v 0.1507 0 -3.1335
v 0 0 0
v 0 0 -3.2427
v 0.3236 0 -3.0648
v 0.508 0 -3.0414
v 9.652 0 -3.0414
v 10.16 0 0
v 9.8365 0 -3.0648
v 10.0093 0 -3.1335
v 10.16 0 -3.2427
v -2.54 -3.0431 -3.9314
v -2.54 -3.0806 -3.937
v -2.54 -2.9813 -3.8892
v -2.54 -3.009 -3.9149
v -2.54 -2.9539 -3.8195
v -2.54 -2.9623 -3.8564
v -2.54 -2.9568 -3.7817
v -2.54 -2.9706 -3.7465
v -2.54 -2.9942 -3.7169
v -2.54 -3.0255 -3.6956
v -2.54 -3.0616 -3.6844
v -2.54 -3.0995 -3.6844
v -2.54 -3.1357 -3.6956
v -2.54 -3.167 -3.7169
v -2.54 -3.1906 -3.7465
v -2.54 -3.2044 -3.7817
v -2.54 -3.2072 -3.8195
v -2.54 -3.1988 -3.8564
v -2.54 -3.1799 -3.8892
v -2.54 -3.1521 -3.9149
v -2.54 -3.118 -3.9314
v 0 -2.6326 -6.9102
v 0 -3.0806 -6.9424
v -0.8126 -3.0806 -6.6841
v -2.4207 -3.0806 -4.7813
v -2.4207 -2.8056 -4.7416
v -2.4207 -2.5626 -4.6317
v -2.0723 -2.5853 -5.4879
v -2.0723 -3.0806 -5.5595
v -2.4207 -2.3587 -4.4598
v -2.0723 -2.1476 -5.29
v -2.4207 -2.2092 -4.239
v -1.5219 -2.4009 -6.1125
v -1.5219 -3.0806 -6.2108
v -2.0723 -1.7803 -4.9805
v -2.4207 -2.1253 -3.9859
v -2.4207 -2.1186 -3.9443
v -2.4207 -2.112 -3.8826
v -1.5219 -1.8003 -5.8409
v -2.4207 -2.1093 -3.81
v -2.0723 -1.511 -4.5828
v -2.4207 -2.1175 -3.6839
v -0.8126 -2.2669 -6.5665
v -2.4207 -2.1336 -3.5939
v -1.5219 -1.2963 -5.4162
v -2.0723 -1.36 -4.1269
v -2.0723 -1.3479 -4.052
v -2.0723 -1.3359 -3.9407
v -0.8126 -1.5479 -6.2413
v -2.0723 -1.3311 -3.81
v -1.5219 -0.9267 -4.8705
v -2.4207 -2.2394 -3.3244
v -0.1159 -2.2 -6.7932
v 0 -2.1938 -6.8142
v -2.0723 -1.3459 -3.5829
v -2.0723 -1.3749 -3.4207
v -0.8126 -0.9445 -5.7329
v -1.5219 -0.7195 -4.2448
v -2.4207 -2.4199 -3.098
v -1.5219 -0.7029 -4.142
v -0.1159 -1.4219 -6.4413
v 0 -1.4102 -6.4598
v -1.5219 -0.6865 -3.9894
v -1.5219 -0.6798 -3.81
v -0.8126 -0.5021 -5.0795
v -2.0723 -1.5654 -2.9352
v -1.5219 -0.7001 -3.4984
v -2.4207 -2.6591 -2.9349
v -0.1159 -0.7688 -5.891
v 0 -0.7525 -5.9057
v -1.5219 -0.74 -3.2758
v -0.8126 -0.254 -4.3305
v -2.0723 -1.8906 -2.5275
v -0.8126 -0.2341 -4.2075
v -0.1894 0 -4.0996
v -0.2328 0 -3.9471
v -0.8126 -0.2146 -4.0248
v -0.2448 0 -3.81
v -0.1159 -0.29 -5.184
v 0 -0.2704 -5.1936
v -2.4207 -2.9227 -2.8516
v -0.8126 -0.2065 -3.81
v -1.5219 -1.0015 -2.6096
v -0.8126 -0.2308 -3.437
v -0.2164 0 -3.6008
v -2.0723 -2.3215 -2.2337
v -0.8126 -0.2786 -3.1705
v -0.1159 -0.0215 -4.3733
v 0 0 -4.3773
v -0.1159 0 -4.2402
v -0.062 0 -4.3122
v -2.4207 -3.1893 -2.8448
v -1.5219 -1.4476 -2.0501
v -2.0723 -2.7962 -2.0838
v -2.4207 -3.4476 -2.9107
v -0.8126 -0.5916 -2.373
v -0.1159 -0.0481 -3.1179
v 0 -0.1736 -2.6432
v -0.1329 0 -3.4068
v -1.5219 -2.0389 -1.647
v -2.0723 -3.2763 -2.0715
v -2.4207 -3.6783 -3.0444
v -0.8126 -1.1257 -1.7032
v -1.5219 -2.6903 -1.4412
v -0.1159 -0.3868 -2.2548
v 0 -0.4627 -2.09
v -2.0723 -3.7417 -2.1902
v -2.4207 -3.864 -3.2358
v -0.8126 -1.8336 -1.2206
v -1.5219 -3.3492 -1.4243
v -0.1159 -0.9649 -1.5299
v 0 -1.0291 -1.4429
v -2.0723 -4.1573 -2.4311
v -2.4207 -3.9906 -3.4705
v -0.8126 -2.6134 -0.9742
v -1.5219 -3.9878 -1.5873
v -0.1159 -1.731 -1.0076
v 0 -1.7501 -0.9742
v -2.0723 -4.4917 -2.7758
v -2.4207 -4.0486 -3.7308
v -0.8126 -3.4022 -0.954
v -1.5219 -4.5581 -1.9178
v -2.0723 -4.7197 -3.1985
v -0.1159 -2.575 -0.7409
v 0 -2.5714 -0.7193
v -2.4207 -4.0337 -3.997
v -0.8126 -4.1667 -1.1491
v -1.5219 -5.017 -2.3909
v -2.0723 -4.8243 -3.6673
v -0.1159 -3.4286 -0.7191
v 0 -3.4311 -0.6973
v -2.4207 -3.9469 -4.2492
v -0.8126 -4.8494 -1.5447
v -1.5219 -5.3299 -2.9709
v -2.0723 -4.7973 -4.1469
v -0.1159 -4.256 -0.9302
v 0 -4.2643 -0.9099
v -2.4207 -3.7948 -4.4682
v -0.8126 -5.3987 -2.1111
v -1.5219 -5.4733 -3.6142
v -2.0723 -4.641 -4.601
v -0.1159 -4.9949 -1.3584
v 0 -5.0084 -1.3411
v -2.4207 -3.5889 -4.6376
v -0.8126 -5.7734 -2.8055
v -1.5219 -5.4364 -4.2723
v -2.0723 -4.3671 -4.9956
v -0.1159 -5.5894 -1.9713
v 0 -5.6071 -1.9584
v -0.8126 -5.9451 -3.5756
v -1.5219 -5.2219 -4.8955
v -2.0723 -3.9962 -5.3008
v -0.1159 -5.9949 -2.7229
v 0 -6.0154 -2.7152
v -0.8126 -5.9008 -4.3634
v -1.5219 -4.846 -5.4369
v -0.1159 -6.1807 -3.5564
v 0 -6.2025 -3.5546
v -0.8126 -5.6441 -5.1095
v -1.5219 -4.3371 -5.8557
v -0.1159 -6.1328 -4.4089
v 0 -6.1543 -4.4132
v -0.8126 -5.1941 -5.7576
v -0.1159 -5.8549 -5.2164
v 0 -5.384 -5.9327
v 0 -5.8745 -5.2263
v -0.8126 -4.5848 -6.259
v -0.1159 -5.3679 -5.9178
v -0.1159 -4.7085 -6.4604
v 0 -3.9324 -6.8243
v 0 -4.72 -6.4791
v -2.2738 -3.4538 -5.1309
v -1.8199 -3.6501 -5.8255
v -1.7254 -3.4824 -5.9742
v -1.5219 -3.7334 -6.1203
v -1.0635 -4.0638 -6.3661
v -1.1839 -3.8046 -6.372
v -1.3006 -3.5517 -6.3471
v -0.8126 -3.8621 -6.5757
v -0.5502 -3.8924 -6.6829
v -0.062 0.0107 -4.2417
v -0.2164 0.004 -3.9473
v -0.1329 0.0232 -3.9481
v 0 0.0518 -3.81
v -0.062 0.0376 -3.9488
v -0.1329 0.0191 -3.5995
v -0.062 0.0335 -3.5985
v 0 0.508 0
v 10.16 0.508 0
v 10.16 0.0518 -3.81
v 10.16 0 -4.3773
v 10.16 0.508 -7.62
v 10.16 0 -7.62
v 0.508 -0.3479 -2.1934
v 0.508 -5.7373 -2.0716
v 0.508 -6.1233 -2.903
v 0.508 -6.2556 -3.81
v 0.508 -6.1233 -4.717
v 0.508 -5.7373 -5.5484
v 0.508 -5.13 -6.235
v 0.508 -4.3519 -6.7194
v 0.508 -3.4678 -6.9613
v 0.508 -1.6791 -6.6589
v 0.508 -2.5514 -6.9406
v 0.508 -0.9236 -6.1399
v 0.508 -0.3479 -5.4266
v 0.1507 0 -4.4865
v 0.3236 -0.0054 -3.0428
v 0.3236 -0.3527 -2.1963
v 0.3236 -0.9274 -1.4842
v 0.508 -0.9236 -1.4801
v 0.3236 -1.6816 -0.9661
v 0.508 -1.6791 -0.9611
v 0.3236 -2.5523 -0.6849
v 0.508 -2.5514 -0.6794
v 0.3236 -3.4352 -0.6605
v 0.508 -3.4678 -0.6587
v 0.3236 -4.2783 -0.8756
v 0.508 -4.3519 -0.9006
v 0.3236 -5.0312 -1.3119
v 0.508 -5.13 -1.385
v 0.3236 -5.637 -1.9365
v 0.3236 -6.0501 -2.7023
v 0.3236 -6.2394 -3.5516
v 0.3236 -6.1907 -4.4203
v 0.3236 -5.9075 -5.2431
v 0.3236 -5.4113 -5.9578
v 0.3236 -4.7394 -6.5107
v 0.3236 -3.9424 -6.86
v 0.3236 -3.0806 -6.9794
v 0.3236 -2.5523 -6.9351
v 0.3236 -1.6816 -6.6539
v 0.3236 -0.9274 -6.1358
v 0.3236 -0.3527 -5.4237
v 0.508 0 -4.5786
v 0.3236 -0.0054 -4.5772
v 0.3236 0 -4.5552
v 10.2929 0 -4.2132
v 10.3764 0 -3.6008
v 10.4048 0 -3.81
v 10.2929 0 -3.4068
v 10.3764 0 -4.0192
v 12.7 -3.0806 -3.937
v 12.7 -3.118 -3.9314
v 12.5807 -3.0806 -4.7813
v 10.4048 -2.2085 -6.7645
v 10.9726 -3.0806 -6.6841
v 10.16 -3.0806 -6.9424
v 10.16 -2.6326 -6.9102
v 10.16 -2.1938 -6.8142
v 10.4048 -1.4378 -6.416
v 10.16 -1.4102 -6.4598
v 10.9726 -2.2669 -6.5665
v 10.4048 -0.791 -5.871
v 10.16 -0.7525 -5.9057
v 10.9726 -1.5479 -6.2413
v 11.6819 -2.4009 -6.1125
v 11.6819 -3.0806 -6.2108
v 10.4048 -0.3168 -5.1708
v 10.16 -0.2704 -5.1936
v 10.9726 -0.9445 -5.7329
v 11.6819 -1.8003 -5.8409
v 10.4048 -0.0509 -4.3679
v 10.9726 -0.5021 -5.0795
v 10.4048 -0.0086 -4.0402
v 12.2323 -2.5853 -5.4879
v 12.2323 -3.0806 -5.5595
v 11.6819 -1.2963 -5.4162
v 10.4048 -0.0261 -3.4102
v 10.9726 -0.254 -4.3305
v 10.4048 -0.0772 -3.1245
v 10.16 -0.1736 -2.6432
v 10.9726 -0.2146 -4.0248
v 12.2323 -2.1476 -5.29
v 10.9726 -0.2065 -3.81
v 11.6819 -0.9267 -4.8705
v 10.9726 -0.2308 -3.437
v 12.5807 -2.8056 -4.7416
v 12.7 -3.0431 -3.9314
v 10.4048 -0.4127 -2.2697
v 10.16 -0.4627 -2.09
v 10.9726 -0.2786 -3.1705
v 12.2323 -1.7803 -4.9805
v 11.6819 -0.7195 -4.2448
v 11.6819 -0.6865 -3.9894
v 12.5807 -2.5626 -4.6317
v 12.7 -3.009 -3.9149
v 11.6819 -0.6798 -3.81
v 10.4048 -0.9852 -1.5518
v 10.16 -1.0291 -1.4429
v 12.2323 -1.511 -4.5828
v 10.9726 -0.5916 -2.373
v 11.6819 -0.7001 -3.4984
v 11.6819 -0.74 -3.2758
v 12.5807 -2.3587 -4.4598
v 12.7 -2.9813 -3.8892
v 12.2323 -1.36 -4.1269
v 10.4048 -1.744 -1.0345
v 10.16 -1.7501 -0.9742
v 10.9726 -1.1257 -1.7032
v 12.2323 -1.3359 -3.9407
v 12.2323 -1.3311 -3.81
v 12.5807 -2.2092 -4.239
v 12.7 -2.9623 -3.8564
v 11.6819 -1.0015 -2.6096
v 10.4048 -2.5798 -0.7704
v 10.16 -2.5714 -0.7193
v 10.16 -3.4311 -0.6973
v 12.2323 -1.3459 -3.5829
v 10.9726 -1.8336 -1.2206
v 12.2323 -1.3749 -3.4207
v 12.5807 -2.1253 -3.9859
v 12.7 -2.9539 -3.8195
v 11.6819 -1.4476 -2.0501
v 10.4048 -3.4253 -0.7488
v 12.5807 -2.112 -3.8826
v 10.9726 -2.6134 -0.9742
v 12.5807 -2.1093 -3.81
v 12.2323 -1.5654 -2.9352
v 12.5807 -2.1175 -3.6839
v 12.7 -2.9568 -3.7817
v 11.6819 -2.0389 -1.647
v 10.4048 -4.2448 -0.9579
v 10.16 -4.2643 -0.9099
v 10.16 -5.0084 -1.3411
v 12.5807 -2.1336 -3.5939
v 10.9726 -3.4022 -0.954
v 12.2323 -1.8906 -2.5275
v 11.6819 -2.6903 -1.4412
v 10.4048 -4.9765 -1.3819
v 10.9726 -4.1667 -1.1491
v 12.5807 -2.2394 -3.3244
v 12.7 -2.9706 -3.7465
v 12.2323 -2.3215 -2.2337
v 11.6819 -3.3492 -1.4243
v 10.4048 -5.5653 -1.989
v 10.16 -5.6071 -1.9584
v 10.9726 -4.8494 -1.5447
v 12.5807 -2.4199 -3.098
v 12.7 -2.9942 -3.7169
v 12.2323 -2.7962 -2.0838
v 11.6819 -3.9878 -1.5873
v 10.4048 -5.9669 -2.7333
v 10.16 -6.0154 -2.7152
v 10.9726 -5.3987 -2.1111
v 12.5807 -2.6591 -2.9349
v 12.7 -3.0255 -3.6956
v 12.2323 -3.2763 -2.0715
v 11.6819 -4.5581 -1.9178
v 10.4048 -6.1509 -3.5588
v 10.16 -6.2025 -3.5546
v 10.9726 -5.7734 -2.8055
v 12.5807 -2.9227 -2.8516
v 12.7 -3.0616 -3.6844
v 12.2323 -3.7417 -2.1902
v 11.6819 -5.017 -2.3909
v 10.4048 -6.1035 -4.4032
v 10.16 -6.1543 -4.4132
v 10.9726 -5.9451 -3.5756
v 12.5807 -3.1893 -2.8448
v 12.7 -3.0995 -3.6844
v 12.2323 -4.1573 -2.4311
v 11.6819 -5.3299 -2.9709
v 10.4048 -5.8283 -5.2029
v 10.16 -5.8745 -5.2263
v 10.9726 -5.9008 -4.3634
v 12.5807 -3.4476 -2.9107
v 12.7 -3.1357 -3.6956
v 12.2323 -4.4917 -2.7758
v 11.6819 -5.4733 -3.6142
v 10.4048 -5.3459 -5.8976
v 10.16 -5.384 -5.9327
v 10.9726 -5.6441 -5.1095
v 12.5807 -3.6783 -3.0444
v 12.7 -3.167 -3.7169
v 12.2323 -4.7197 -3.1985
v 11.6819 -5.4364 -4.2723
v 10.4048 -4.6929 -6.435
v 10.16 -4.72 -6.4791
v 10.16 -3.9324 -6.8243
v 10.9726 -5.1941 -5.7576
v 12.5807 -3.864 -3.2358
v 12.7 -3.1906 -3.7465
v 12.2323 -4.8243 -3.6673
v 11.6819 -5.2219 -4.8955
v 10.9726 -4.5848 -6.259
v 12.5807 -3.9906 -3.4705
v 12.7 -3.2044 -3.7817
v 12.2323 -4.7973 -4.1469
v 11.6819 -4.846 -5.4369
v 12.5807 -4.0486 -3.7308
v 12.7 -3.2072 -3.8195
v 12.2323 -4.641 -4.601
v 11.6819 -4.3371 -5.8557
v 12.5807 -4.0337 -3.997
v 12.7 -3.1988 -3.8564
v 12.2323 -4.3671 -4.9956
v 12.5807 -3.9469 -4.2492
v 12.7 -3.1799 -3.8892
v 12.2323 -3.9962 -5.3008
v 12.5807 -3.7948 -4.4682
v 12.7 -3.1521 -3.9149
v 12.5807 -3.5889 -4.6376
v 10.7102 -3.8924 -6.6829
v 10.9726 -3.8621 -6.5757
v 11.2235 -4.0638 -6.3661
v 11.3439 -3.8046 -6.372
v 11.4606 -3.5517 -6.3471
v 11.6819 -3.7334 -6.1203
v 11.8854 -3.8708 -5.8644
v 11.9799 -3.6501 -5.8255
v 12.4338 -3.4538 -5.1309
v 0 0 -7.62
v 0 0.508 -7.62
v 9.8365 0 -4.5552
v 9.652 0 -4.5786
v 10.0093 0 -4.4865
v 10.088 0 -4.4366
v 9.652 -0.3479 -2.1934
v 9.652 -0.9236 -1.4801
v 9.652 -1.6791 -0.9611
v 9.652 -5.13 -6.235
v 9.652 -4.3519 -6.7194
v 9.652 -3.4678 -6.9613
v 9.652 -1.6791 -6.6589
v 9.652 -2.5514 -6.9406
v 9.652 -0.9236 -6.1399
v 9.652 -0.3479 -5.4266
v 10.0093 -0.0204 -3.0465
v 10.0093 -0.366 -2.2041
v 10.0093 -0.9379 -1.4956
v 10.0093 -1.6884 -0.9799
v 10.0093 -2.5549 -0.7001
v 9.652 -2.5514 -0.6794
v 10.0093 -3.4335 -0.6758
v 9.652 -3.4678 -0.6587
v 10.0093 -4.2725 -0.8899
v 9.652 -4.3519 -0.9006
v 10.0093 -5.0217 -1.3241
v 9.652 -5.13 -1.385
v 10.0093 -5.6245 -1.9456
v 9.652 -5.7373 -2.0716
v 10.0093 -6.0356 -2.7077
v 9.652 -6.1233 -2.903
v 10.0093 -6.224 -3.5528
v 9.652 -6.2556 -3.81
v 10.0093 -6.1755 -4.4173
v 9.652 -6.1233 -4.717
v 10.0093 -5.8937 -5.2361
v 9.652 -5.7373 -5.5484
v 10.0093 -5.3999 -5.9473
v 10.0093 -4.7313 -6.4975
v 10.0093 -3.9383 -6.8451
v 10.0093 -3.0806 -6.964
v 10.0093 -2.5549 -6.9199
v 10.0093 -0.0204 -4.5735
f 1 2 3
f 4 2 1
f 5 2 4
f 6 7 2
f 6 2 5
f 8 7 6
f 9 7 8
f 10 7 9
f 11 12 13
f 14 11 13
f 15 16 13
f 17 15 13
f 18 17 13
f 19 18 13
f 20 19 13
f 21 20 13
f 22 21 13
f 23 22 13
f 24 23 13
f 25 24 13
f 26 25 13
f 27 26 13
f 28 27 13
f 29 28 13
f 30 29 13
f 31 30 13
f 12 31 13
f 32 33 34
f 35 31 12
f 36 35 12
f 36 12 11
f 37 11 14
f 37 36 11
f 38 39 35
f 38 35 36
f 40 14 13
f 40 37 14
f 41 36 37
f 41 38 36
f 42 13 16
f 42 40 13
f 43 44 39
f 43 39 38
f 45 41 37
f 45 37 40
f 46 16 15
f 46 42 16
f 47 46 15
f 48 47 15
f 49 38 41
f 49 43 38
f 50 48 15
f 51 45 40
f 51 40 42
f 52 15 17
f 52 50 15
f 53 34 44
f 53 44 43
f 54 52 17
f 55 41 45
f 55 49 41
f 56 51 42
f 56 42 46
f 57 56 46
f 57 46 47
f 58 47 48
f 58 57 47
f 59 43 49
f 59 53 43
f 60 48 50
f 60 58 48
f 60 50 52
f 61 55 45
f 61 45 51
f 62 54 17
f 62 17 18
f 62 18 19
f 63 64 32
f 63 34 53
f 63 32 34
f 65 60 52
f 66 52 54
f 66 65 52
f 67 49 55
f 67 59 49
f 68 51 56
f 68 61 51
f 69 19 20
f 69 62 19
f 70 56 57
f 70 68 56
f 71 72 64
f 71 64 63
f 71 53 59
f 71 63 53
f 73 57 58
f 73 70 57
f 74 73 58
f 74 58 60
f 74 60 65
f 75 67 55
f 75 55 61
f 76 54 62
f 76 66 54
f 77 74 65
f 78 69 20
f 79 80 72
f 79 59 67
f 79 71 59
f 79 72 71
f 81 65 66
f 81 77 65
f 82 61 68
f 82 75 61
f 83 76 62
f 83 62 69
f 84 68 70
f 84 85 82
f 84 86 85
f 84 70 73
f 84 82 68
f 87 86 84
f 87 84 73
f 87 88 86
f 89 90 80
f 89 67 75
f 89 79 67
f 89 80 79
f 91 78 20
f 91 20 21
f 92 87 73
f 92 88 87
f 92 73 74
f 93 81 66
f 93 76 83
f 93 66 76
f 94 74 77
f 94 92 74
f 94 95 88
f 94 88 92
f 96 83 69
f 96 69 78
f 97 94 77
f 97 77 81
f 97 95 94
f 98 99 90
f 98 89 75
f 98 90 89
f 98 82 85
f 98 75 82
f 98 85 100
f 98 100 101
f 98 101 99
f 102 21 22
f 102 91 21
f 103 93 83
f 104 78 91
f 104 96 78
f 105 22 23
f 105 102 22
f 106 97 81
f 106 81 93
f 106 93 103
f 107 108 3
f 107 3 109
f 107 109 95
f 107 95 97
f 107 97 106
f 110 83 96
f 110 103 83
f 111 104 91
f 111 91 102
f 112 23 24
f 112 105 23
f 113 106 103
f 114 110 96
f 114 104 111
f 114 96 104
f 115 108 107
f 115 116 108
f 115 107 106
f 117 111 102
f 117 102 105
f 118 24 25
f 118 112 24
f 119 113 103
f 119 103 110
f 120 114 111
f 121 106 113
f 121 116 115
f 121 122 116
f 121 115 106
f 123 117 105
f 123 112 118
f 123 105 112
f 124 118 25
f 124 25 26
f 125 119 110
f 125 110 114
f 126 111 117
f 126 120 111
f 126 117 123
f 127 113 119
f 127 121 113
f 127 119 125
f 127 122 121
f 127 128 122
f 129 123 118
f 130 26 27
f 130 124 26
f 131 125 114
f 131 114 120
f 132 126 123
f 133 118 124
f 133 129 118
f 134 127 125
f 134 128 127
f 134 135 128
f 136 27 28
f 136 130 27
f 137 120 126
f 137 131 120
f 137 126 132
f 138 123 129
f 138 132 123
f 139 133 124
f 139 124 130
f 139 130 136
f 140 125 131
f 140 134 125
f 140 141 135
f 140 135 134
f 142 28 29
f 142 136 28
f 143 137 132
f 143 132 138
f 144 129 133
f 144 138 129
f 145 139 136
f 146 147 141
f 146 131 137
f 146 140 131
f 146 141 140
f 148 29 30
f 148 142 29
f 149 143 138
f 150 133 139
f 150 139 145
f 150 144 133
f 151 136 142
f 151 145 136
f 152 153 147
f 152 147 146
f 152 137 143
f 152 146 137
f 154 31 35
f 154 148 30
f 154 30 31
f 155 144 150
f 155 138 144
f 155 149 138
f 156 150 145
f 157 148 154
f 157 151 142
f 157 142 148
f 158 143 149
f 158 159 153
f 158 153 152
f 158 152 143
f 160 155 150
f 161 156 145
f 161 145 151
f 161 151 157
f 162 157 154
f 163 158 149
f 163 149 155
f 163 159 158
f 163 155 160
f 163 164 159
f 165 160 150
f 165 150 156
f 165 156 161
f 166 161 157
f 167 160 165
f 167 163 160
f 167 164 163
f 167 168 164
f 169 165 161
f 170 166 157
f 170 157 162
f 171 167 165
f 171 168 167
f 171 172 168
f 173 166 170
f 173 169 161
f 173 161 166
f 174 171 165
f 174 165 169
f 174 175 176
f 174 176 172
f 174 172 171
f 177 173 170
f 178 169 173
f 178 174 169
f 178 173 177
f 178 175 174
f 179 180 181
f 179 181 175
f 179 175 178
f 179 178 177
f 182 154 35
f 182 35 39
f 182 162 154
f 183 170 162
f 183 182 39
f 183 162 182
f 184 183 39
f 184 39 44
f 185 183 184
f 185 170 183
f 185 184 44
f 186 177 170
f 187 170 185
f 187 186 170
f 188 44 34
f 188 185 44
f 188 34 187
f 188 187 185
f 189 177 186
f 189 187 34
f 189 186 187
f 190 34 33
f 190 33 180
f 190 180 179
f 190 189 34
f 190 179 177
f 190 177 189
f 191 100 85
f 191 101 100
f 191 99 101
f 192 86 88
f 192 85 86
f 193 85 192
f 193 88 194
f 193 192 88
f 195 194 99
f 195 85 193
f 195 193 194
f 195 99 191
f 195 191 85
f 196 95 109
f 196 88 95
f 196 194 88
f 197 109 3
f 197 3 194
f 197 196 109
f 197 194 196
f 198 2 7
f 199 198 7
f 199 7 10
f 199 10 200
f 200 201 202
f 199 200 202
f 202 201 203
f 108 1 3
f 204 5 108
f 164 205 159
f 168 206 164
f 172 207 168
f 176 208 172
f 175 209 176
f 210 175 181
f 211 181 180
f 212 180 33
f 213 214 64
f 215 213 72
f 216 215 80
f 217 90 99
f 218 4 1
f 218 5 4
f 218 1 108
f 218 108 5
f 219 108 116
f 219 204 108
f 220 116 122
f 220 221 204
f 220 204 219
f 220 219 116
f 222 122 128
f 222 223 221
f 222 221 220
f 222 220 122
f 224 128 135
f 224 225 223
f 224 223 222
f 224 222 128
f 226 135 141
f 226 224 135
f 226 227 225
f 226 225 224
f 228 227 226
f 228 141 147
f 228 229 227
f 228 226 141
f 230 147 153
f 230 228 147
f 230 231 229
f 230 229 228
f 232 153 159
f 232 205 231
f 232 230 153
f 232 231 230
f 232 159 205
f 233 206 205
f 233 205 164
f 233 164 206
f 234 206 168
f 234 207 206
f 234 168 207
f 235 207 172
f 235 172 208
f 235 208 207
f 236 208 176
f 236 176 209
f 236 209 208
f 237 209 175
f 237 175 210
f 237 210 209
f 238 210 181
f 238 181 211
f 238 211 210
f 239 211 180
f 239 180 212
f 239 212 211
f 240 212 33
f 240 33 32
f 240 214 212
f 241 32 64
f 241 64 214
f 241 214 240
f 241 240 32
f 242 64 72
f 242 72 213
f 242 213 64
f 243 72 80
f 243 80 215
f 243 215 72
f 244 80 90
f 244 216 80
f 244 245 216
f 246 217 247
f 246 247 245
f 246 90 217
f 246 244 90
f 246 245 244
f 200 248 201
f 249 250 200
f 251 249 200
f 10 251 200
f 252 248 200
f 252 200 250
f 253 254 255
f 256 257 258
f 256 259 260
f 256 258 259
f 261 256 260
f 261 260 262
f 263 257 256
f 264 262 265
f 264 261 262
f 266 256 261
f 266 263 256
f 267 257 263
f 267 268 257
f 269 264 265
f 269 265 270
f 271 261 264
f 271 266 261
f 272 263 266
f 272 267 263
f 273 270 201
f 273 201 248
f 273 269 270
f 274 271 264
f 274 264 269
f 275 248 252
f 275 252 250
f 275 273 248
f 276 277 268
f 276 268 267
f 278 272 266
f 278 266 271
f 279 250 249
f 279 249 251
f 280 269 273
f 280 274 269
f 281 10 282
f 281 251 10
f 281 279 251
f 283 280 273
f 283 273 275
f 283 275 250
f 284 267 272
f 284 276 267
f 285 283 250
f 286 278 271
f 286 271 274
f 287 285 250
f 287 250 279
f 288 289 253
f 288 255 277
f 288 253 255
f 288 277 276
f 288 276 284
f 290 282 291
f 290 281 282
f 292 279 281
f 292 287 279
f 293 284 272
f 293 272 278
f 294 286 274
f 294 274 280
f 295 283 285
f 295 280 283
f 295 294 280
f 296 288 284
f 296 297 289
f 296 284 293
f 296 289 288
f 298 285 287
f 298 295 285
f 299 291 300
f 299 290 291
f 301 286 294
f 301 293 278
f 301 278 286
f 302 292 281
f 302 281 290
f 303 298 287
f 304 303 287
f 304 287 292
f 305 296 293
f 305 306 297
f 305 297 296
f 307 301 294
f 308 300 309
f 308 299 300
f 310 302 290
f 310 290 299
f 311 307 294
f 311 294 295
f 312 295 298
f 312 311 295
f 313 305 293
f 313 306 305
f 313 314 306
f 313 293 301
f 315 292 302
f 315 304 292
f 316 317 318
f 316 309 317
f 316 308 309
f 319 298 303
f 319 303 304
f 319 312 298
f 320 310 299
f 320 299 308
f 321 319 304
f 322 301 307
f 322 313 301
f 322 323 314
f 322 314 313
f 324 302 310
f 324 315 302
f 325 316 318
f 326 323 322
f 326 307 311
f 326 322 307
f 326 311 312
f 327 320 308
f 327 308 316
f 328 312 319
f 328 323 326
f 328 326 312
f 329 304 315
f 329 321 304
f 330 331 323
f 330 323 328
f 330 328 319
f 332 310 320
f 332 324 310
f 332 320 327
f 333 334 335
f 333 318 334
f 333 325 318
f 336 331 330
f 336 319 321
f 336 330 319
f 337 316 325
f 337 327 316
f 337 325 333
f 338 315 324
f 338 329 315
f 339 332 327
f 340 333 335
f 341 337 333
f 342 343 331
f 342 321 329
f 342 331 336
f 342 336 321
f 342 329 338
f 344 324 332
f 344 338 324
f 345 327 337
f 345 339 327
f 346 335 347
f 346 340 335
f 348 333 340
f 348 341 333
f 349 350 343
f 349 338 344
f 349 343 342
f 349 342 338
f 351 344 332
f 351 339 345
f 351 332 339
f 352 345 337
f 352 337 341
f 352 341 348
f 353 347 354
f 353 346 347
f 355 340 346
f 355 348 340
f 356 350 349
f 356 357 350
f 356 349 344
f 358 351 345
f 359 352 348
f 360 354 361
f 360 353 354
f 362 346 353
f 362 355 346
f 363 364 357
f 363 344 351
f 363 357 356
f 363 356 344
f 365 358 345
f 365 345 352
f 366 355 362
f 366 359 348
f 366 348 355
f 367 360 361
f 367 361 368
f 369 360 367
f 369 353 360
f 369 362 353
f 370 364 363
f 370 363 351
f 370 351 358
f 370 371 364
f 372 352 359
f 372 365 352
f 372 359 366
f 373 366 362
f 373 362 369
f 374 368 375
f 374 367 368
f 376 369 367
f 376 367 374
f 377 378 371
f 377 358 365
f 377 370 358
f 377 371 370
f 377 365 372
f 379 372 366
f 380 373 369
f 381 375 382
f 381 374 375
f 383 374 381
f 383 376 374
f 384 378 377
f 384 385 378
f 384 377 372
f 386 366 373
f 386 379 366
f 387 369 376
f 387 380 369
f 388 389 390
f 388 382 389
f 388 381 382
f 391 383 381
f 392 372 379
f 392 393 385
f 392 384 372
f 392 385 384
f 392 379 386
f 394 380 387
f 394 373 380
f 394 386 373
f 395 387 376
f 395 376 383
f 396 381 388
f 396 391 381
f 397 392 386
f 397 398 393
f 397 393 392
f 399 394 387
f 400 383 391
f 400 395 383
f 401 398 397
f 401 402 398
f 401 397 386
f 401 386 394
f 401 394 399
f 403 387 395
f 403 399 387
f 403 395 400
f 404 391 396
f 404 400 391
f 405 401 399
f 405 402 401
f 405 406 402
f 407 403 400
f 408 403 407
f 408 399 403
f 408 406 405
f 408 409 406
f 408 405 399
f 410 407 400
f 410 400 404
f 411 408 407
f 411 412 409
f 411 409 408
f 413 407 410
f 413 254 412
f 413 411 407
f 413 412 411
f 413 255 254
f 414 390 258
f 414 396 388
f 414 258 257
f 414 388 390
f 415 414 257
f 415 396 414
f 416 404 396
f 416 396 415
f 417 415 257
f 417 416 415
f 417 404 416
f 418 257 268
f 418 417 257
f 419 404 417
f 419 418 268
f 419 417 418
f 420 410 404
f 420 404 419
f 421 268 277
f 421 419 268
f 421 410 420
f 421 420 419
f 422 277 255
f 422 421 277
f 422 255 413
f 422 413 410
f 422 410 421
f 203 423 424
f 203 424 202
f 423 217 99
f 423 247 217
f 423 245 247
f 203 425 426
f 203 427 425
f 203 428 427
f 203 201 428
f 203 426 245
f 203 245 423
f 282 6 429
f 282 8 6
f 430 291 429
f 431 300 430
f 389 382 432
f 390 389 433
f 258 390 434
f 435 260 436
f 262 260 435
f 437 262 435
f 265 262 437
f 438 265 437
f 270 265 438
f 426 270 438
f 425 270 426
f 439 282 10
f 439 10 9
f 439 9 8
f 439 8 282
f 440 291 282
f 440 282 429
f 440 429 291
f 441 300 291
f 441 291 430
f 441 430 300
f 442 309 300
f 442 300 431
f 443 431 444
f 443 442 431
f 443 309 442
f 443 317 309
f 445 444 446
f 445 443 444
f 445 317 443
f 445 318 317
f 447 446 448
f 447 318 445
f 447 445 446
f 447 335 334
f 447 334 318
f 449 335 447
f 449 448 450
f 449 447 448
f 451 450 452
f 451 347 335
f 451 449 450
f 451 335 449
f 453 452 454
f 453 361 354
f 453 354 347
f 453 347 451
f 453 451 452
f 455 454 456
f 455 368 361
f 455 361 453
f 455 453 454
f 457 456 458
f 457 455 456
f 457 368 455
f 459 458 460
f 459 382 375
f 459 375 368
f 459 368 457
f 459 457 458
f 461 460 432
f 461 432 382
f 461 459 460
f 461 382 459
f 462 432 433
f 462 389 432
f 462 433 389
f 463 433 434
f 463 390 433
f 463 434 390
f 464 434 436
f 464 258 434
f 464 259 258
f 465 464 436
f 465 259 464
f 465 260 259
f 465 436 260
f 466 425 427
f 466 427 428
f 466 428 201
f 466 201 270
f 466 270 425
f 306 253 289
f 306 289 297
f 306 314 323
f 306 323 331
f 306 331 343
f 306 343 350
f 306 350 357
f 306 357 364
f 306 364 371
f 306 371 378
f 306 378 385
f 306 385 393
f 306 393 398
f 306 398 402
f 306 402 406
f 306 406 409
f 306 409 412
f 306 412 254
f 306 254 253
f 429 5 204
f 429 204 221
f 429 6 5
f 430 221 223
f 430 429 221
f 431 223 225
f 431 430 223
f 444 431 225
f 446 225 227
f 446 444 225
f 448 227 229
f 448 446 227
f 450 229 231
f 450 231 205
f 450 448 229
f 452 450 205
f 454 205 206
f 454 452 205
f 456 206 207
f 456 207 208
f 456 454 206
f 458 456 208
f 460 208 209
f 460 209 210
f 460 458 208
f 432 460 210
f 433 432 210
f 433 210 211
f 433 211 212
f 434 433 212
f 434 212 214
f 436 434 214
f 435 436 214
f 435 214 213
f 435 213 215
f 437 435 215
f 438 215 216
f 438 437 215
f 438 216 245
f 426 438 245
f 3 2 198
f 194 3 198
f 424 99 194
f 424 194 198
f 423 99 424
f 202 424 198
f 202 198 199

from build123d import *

# Parameters (mm, degrees)
SKETCH1_W           = 10.16
SKETCH1_H           = 7.62
BOSS_EXTRUDE1_DEPTH = 0.508
SKETCH2_R           = 3.175
BOSS_EXTRUDE2_DEPTH = 15.24
FILLET1_R           = 3.048
FILLET2_R           = 3.048


with BuildPart() as part:
    # Sketch1 → Boss-Extrude1 (new body)
    with BuildSketch(Plane(origin=(0, 0, 0), x_dir=(1, 0, 0), z_dir=(0, 1, 0))):
        with Locations((5.08, 3.81)):
            Rectangle(SKETCH1_W, SKETCH1_H)
    extrude(amount=BOSS_EXTRUDE1_DEPTH)

    # Sketch2 → Boss-Extrude2 (add)
    with BuildSketch(Plane(origin=(12.7, 0, 0), x_dir=(0, 0, -1), z_dir=(1, 0, 0))):
        with Locations((3.81, -3.080568226)):
            Circle(SKETCH2_R)
    extrude(amount=-BOSS_EXTRUDE2_DEPTH)

    # Fillet1
    # the kernel refuses this fillet: 3.048 mm, written as the material it takes off along each edge
    with BuildSketch(Plane(origin=(-2.54, -3.080568226, -3.81), x_dir=(0, 0, -1), z_dir=(0, -1, 0))) as fillet1_piece_1_section:
        with BuildLine():
            CenterArc((3.175 - FILLET1_R, FILLET1_R), FILLET1_R, 270, 90)
            Line((3.175 - FILLET1_R, 0), (3.175, 0))
            Line((3.175, 0), (3.175, FILLET1_R))
        make_face()
    fillet1_piece_1 = revolve(axis=Axis((-2.54, -3.080568226, -3.81), (1, 0, 0)), mode=Mode.PRIVATE)
    fillet1_piece_1 = split(fillet1_piece_1, bisect_by=Plane(origin=(0, -1.050120042, -6.248507941), z_dir=(1, 0, 0)), keep=Keep.TOP, mode=Mode.PRIVATE)
    fillet1_piece_1 = split(fillet1_piece_1, bisect_by=Plane(origin=(0.252364317, 0, -6.248507941), z_dir=(0, -1, 0)), keep=Keep.TOP, mode=Mode.PRIVATE)
    add(fillet1_piece_1, mode=Mode.SUBTRACT)
    with BuildSketch(Plane(origin=(-2.54, -3.080568226, -3.81), x_dir=(0, 0, -1), z_dir=(0, -1, 0))) as fillet1_piece_2_section:
        with BuildLine():
            CenterArc((3.175 - FILLET1_R, FILLET1_R), FILLET1_R, 270, 90)
            Line((3.175 - FILLET1_R, 0), (3.175, 0))
            Line((3.175, 0), (3.175, FILLET1_R))
        make_face()
    fillet1_piece_2 = revolve(axis=Axis((-2.54, -3.080568226, -3.81), (1, 0, 0)), mode=Mode.PRIVATE)
    fillet1_piece_2 = split(fillet1_piece_2, bisect_by=Plane(origin=(0, -3.080568226, -1.694272015), z_dir=(-1, 0, 0)), keep=Keep.TOP, mode=Mode.PRIVATE)
    fillet1_piece_2 = split(fillet1_piece_2, bisect_by=Plane(origin=(-1.845094679, 0, -1.694272015), z_dir=(0, -1, 0)), keep=Keep.TOP, mode=Mode.PRIVATE)
    add(fillet1_piece_2, mode=Mode.SUBTRACT)
    with BuildSketch(Plane(origin=(-2.54, -3.080568226, -3.81), x_dir=(0, 0, -1), z_dir=(0, -1, 0))) as fillet1_piece_3_section:
        with BuildLine():
            CenterArc((3.175 - FILLET1_R, FILLET1_R), FILLET1_R, 270, 90)
            Line((3.175 - FILLET1_R, 0), (3.175, 0))
            Line((3.175, 0), (3.175, FILLET1_R))
        make_face()
    fillet1_piece_3 = revolve(axis=Axis((-2.54, -3.080568226, -3.81), (1, 0, 0)), mode=Mode.PRIVATE)
    fillet1_piece_3 = split(fillet1_piece_3, bisect_by=Plane(origin=(0, 0.062655826, -3.81), z_dir=(-1, 0, 0)), keep=Keep.TOP, mode=Mode.PRIVATE)
    fillet1_piece_3 = split(fillet1_piece_3, bisect_by=Plane(origin=(-1.310113103, 0, -3.81), z_dir=(0, 1, 0)), keep=Keep.TOP, mode=Mode.PRIVATE)
    add(fillet1_piece_3, mode=Mode.SUBTRACT)

    # Fillet2
    # the kernel refuses this fillet: 3.048 mm, written as the material it takes off along each edge
    with BuildSketch(Plane(origin=(12.7, -3.080568226, -3.81), x_dir=(0, 0, -1), z_dir=(0, -1, 0))) as fillet2_piece_1_section:
        with BuildLine():
            CenterArc((3.175 - FILLET2_R, -FILLET2_R), FILLET2_R, 0, 90)
            Line((3.175 - FILLET2_R, 0), (3.175, 0))
            Line((3.175, 0), (3.175, -FILLET2_R))
        make_face()
    fillet2_piece_1 = revolve(axis=Axis((12.7, -3.080568226, -3.81), (1, 0, 0)), mode=Mode.PRIVATE)
    fillet2_piece_1 = split(fillet2_piece_1, bisect_by=Plane(origin=(9.907635683, 0, -6.248507942), z_dir=(0, -1, 0)), keep=Keep.TOP, mode=Mode.PRIVATE)
    fillet2_piece_1 = split(fillet2_piece_1, bisect_by=Plane(origin=(10.16, -1.050120042, -6.248507942), z_dir=(-1, 0, 0)), keep=Keep.TOP, mode=Mode.PRIVATE)
    add(fillet2_piece_1, mode=Mode.SUBTRACT)
    with BuildSketch(Plane(origin=(12.7, -3.080568226, -3.81), x_dir=(0, 0, -1), z_dir=(0, -1, 0))) as fillet2_piece_2_section:
        with BuildLine():
            CenterArc((3.175 - FILLET2_R, -FILLET2_R), FILLET2_R, 0, 90)
            Line((3.175 - FILLET2_R, 0), (3.175, 0))
            Line((3.175, 0), (3.175, -FILLET2_R))
        make_face()
    fillet2_piece_2 = revolve(axis=Axis((12.7, -3.080568226, -3.81), (1, 0, 0)), mode=Mode.PRIVATE)
    fillet2_piece_2 = split(fillet2_piece_2, bisect_by=Plane(origin=(12.005094679, 0, -1.694272014), z_dir=(0, -1, 0)), keep=Keep.TOP, mode=Mode.PRIVATE)
    fillet2_piece_2 = split(fillet2_piece_2, bisect_by=Plane(origin=(10.16, -3.080568226, -1.694272014), z_dir=(1, 0, 0)), keep=Keep.TOP, mode=Mode.PRIVATE)
    add(fillet2_piece_2, mode=Mode.SUBTRACT)
    with BuildSketch(Plane(origin=(12.7, -3.080568226, -3.81), x_dir=(0, 0, -1), z_dir=(0, -1, 0))) as fillet2_piece_3_section:
        with BuildLine():
            CenterArc((3.175 - FILLET2_R, -FILLET2_R), FILLET2_R, 0, 90)
            Line((3.175 - FILLET2_R, 0), (3.175, 0))
            Line((3.175, 0), (3.175, -FILLET2_R))
        make_face()
    fillet2_piece_3 = revolve(axis=Axis((12.7, -3.080568226, -3.81), (1, 0, 0)), mode=Mode.PRIVATE)
    fillet2_piece_3 = split(fillet2_piece_3, bisect_by=Plane(origin=(11.470113103, 0, -3.81), z_dir=(0, 1, 0)), keep=Keep.TOP, mode=Mode.PRIVATE)
    fillet2_piece_3 = split(fillet2_piece_3, bisect_by=Plane(origin=(10.16, 0.062655826, -3.81), z_dir=(1, 0, 0)), keep=Keep.TOP, mode=Mode.PRIVATE)
    add(fillet2_piece_3, mode=Mode.SUBTRACT)


solid = part.part
